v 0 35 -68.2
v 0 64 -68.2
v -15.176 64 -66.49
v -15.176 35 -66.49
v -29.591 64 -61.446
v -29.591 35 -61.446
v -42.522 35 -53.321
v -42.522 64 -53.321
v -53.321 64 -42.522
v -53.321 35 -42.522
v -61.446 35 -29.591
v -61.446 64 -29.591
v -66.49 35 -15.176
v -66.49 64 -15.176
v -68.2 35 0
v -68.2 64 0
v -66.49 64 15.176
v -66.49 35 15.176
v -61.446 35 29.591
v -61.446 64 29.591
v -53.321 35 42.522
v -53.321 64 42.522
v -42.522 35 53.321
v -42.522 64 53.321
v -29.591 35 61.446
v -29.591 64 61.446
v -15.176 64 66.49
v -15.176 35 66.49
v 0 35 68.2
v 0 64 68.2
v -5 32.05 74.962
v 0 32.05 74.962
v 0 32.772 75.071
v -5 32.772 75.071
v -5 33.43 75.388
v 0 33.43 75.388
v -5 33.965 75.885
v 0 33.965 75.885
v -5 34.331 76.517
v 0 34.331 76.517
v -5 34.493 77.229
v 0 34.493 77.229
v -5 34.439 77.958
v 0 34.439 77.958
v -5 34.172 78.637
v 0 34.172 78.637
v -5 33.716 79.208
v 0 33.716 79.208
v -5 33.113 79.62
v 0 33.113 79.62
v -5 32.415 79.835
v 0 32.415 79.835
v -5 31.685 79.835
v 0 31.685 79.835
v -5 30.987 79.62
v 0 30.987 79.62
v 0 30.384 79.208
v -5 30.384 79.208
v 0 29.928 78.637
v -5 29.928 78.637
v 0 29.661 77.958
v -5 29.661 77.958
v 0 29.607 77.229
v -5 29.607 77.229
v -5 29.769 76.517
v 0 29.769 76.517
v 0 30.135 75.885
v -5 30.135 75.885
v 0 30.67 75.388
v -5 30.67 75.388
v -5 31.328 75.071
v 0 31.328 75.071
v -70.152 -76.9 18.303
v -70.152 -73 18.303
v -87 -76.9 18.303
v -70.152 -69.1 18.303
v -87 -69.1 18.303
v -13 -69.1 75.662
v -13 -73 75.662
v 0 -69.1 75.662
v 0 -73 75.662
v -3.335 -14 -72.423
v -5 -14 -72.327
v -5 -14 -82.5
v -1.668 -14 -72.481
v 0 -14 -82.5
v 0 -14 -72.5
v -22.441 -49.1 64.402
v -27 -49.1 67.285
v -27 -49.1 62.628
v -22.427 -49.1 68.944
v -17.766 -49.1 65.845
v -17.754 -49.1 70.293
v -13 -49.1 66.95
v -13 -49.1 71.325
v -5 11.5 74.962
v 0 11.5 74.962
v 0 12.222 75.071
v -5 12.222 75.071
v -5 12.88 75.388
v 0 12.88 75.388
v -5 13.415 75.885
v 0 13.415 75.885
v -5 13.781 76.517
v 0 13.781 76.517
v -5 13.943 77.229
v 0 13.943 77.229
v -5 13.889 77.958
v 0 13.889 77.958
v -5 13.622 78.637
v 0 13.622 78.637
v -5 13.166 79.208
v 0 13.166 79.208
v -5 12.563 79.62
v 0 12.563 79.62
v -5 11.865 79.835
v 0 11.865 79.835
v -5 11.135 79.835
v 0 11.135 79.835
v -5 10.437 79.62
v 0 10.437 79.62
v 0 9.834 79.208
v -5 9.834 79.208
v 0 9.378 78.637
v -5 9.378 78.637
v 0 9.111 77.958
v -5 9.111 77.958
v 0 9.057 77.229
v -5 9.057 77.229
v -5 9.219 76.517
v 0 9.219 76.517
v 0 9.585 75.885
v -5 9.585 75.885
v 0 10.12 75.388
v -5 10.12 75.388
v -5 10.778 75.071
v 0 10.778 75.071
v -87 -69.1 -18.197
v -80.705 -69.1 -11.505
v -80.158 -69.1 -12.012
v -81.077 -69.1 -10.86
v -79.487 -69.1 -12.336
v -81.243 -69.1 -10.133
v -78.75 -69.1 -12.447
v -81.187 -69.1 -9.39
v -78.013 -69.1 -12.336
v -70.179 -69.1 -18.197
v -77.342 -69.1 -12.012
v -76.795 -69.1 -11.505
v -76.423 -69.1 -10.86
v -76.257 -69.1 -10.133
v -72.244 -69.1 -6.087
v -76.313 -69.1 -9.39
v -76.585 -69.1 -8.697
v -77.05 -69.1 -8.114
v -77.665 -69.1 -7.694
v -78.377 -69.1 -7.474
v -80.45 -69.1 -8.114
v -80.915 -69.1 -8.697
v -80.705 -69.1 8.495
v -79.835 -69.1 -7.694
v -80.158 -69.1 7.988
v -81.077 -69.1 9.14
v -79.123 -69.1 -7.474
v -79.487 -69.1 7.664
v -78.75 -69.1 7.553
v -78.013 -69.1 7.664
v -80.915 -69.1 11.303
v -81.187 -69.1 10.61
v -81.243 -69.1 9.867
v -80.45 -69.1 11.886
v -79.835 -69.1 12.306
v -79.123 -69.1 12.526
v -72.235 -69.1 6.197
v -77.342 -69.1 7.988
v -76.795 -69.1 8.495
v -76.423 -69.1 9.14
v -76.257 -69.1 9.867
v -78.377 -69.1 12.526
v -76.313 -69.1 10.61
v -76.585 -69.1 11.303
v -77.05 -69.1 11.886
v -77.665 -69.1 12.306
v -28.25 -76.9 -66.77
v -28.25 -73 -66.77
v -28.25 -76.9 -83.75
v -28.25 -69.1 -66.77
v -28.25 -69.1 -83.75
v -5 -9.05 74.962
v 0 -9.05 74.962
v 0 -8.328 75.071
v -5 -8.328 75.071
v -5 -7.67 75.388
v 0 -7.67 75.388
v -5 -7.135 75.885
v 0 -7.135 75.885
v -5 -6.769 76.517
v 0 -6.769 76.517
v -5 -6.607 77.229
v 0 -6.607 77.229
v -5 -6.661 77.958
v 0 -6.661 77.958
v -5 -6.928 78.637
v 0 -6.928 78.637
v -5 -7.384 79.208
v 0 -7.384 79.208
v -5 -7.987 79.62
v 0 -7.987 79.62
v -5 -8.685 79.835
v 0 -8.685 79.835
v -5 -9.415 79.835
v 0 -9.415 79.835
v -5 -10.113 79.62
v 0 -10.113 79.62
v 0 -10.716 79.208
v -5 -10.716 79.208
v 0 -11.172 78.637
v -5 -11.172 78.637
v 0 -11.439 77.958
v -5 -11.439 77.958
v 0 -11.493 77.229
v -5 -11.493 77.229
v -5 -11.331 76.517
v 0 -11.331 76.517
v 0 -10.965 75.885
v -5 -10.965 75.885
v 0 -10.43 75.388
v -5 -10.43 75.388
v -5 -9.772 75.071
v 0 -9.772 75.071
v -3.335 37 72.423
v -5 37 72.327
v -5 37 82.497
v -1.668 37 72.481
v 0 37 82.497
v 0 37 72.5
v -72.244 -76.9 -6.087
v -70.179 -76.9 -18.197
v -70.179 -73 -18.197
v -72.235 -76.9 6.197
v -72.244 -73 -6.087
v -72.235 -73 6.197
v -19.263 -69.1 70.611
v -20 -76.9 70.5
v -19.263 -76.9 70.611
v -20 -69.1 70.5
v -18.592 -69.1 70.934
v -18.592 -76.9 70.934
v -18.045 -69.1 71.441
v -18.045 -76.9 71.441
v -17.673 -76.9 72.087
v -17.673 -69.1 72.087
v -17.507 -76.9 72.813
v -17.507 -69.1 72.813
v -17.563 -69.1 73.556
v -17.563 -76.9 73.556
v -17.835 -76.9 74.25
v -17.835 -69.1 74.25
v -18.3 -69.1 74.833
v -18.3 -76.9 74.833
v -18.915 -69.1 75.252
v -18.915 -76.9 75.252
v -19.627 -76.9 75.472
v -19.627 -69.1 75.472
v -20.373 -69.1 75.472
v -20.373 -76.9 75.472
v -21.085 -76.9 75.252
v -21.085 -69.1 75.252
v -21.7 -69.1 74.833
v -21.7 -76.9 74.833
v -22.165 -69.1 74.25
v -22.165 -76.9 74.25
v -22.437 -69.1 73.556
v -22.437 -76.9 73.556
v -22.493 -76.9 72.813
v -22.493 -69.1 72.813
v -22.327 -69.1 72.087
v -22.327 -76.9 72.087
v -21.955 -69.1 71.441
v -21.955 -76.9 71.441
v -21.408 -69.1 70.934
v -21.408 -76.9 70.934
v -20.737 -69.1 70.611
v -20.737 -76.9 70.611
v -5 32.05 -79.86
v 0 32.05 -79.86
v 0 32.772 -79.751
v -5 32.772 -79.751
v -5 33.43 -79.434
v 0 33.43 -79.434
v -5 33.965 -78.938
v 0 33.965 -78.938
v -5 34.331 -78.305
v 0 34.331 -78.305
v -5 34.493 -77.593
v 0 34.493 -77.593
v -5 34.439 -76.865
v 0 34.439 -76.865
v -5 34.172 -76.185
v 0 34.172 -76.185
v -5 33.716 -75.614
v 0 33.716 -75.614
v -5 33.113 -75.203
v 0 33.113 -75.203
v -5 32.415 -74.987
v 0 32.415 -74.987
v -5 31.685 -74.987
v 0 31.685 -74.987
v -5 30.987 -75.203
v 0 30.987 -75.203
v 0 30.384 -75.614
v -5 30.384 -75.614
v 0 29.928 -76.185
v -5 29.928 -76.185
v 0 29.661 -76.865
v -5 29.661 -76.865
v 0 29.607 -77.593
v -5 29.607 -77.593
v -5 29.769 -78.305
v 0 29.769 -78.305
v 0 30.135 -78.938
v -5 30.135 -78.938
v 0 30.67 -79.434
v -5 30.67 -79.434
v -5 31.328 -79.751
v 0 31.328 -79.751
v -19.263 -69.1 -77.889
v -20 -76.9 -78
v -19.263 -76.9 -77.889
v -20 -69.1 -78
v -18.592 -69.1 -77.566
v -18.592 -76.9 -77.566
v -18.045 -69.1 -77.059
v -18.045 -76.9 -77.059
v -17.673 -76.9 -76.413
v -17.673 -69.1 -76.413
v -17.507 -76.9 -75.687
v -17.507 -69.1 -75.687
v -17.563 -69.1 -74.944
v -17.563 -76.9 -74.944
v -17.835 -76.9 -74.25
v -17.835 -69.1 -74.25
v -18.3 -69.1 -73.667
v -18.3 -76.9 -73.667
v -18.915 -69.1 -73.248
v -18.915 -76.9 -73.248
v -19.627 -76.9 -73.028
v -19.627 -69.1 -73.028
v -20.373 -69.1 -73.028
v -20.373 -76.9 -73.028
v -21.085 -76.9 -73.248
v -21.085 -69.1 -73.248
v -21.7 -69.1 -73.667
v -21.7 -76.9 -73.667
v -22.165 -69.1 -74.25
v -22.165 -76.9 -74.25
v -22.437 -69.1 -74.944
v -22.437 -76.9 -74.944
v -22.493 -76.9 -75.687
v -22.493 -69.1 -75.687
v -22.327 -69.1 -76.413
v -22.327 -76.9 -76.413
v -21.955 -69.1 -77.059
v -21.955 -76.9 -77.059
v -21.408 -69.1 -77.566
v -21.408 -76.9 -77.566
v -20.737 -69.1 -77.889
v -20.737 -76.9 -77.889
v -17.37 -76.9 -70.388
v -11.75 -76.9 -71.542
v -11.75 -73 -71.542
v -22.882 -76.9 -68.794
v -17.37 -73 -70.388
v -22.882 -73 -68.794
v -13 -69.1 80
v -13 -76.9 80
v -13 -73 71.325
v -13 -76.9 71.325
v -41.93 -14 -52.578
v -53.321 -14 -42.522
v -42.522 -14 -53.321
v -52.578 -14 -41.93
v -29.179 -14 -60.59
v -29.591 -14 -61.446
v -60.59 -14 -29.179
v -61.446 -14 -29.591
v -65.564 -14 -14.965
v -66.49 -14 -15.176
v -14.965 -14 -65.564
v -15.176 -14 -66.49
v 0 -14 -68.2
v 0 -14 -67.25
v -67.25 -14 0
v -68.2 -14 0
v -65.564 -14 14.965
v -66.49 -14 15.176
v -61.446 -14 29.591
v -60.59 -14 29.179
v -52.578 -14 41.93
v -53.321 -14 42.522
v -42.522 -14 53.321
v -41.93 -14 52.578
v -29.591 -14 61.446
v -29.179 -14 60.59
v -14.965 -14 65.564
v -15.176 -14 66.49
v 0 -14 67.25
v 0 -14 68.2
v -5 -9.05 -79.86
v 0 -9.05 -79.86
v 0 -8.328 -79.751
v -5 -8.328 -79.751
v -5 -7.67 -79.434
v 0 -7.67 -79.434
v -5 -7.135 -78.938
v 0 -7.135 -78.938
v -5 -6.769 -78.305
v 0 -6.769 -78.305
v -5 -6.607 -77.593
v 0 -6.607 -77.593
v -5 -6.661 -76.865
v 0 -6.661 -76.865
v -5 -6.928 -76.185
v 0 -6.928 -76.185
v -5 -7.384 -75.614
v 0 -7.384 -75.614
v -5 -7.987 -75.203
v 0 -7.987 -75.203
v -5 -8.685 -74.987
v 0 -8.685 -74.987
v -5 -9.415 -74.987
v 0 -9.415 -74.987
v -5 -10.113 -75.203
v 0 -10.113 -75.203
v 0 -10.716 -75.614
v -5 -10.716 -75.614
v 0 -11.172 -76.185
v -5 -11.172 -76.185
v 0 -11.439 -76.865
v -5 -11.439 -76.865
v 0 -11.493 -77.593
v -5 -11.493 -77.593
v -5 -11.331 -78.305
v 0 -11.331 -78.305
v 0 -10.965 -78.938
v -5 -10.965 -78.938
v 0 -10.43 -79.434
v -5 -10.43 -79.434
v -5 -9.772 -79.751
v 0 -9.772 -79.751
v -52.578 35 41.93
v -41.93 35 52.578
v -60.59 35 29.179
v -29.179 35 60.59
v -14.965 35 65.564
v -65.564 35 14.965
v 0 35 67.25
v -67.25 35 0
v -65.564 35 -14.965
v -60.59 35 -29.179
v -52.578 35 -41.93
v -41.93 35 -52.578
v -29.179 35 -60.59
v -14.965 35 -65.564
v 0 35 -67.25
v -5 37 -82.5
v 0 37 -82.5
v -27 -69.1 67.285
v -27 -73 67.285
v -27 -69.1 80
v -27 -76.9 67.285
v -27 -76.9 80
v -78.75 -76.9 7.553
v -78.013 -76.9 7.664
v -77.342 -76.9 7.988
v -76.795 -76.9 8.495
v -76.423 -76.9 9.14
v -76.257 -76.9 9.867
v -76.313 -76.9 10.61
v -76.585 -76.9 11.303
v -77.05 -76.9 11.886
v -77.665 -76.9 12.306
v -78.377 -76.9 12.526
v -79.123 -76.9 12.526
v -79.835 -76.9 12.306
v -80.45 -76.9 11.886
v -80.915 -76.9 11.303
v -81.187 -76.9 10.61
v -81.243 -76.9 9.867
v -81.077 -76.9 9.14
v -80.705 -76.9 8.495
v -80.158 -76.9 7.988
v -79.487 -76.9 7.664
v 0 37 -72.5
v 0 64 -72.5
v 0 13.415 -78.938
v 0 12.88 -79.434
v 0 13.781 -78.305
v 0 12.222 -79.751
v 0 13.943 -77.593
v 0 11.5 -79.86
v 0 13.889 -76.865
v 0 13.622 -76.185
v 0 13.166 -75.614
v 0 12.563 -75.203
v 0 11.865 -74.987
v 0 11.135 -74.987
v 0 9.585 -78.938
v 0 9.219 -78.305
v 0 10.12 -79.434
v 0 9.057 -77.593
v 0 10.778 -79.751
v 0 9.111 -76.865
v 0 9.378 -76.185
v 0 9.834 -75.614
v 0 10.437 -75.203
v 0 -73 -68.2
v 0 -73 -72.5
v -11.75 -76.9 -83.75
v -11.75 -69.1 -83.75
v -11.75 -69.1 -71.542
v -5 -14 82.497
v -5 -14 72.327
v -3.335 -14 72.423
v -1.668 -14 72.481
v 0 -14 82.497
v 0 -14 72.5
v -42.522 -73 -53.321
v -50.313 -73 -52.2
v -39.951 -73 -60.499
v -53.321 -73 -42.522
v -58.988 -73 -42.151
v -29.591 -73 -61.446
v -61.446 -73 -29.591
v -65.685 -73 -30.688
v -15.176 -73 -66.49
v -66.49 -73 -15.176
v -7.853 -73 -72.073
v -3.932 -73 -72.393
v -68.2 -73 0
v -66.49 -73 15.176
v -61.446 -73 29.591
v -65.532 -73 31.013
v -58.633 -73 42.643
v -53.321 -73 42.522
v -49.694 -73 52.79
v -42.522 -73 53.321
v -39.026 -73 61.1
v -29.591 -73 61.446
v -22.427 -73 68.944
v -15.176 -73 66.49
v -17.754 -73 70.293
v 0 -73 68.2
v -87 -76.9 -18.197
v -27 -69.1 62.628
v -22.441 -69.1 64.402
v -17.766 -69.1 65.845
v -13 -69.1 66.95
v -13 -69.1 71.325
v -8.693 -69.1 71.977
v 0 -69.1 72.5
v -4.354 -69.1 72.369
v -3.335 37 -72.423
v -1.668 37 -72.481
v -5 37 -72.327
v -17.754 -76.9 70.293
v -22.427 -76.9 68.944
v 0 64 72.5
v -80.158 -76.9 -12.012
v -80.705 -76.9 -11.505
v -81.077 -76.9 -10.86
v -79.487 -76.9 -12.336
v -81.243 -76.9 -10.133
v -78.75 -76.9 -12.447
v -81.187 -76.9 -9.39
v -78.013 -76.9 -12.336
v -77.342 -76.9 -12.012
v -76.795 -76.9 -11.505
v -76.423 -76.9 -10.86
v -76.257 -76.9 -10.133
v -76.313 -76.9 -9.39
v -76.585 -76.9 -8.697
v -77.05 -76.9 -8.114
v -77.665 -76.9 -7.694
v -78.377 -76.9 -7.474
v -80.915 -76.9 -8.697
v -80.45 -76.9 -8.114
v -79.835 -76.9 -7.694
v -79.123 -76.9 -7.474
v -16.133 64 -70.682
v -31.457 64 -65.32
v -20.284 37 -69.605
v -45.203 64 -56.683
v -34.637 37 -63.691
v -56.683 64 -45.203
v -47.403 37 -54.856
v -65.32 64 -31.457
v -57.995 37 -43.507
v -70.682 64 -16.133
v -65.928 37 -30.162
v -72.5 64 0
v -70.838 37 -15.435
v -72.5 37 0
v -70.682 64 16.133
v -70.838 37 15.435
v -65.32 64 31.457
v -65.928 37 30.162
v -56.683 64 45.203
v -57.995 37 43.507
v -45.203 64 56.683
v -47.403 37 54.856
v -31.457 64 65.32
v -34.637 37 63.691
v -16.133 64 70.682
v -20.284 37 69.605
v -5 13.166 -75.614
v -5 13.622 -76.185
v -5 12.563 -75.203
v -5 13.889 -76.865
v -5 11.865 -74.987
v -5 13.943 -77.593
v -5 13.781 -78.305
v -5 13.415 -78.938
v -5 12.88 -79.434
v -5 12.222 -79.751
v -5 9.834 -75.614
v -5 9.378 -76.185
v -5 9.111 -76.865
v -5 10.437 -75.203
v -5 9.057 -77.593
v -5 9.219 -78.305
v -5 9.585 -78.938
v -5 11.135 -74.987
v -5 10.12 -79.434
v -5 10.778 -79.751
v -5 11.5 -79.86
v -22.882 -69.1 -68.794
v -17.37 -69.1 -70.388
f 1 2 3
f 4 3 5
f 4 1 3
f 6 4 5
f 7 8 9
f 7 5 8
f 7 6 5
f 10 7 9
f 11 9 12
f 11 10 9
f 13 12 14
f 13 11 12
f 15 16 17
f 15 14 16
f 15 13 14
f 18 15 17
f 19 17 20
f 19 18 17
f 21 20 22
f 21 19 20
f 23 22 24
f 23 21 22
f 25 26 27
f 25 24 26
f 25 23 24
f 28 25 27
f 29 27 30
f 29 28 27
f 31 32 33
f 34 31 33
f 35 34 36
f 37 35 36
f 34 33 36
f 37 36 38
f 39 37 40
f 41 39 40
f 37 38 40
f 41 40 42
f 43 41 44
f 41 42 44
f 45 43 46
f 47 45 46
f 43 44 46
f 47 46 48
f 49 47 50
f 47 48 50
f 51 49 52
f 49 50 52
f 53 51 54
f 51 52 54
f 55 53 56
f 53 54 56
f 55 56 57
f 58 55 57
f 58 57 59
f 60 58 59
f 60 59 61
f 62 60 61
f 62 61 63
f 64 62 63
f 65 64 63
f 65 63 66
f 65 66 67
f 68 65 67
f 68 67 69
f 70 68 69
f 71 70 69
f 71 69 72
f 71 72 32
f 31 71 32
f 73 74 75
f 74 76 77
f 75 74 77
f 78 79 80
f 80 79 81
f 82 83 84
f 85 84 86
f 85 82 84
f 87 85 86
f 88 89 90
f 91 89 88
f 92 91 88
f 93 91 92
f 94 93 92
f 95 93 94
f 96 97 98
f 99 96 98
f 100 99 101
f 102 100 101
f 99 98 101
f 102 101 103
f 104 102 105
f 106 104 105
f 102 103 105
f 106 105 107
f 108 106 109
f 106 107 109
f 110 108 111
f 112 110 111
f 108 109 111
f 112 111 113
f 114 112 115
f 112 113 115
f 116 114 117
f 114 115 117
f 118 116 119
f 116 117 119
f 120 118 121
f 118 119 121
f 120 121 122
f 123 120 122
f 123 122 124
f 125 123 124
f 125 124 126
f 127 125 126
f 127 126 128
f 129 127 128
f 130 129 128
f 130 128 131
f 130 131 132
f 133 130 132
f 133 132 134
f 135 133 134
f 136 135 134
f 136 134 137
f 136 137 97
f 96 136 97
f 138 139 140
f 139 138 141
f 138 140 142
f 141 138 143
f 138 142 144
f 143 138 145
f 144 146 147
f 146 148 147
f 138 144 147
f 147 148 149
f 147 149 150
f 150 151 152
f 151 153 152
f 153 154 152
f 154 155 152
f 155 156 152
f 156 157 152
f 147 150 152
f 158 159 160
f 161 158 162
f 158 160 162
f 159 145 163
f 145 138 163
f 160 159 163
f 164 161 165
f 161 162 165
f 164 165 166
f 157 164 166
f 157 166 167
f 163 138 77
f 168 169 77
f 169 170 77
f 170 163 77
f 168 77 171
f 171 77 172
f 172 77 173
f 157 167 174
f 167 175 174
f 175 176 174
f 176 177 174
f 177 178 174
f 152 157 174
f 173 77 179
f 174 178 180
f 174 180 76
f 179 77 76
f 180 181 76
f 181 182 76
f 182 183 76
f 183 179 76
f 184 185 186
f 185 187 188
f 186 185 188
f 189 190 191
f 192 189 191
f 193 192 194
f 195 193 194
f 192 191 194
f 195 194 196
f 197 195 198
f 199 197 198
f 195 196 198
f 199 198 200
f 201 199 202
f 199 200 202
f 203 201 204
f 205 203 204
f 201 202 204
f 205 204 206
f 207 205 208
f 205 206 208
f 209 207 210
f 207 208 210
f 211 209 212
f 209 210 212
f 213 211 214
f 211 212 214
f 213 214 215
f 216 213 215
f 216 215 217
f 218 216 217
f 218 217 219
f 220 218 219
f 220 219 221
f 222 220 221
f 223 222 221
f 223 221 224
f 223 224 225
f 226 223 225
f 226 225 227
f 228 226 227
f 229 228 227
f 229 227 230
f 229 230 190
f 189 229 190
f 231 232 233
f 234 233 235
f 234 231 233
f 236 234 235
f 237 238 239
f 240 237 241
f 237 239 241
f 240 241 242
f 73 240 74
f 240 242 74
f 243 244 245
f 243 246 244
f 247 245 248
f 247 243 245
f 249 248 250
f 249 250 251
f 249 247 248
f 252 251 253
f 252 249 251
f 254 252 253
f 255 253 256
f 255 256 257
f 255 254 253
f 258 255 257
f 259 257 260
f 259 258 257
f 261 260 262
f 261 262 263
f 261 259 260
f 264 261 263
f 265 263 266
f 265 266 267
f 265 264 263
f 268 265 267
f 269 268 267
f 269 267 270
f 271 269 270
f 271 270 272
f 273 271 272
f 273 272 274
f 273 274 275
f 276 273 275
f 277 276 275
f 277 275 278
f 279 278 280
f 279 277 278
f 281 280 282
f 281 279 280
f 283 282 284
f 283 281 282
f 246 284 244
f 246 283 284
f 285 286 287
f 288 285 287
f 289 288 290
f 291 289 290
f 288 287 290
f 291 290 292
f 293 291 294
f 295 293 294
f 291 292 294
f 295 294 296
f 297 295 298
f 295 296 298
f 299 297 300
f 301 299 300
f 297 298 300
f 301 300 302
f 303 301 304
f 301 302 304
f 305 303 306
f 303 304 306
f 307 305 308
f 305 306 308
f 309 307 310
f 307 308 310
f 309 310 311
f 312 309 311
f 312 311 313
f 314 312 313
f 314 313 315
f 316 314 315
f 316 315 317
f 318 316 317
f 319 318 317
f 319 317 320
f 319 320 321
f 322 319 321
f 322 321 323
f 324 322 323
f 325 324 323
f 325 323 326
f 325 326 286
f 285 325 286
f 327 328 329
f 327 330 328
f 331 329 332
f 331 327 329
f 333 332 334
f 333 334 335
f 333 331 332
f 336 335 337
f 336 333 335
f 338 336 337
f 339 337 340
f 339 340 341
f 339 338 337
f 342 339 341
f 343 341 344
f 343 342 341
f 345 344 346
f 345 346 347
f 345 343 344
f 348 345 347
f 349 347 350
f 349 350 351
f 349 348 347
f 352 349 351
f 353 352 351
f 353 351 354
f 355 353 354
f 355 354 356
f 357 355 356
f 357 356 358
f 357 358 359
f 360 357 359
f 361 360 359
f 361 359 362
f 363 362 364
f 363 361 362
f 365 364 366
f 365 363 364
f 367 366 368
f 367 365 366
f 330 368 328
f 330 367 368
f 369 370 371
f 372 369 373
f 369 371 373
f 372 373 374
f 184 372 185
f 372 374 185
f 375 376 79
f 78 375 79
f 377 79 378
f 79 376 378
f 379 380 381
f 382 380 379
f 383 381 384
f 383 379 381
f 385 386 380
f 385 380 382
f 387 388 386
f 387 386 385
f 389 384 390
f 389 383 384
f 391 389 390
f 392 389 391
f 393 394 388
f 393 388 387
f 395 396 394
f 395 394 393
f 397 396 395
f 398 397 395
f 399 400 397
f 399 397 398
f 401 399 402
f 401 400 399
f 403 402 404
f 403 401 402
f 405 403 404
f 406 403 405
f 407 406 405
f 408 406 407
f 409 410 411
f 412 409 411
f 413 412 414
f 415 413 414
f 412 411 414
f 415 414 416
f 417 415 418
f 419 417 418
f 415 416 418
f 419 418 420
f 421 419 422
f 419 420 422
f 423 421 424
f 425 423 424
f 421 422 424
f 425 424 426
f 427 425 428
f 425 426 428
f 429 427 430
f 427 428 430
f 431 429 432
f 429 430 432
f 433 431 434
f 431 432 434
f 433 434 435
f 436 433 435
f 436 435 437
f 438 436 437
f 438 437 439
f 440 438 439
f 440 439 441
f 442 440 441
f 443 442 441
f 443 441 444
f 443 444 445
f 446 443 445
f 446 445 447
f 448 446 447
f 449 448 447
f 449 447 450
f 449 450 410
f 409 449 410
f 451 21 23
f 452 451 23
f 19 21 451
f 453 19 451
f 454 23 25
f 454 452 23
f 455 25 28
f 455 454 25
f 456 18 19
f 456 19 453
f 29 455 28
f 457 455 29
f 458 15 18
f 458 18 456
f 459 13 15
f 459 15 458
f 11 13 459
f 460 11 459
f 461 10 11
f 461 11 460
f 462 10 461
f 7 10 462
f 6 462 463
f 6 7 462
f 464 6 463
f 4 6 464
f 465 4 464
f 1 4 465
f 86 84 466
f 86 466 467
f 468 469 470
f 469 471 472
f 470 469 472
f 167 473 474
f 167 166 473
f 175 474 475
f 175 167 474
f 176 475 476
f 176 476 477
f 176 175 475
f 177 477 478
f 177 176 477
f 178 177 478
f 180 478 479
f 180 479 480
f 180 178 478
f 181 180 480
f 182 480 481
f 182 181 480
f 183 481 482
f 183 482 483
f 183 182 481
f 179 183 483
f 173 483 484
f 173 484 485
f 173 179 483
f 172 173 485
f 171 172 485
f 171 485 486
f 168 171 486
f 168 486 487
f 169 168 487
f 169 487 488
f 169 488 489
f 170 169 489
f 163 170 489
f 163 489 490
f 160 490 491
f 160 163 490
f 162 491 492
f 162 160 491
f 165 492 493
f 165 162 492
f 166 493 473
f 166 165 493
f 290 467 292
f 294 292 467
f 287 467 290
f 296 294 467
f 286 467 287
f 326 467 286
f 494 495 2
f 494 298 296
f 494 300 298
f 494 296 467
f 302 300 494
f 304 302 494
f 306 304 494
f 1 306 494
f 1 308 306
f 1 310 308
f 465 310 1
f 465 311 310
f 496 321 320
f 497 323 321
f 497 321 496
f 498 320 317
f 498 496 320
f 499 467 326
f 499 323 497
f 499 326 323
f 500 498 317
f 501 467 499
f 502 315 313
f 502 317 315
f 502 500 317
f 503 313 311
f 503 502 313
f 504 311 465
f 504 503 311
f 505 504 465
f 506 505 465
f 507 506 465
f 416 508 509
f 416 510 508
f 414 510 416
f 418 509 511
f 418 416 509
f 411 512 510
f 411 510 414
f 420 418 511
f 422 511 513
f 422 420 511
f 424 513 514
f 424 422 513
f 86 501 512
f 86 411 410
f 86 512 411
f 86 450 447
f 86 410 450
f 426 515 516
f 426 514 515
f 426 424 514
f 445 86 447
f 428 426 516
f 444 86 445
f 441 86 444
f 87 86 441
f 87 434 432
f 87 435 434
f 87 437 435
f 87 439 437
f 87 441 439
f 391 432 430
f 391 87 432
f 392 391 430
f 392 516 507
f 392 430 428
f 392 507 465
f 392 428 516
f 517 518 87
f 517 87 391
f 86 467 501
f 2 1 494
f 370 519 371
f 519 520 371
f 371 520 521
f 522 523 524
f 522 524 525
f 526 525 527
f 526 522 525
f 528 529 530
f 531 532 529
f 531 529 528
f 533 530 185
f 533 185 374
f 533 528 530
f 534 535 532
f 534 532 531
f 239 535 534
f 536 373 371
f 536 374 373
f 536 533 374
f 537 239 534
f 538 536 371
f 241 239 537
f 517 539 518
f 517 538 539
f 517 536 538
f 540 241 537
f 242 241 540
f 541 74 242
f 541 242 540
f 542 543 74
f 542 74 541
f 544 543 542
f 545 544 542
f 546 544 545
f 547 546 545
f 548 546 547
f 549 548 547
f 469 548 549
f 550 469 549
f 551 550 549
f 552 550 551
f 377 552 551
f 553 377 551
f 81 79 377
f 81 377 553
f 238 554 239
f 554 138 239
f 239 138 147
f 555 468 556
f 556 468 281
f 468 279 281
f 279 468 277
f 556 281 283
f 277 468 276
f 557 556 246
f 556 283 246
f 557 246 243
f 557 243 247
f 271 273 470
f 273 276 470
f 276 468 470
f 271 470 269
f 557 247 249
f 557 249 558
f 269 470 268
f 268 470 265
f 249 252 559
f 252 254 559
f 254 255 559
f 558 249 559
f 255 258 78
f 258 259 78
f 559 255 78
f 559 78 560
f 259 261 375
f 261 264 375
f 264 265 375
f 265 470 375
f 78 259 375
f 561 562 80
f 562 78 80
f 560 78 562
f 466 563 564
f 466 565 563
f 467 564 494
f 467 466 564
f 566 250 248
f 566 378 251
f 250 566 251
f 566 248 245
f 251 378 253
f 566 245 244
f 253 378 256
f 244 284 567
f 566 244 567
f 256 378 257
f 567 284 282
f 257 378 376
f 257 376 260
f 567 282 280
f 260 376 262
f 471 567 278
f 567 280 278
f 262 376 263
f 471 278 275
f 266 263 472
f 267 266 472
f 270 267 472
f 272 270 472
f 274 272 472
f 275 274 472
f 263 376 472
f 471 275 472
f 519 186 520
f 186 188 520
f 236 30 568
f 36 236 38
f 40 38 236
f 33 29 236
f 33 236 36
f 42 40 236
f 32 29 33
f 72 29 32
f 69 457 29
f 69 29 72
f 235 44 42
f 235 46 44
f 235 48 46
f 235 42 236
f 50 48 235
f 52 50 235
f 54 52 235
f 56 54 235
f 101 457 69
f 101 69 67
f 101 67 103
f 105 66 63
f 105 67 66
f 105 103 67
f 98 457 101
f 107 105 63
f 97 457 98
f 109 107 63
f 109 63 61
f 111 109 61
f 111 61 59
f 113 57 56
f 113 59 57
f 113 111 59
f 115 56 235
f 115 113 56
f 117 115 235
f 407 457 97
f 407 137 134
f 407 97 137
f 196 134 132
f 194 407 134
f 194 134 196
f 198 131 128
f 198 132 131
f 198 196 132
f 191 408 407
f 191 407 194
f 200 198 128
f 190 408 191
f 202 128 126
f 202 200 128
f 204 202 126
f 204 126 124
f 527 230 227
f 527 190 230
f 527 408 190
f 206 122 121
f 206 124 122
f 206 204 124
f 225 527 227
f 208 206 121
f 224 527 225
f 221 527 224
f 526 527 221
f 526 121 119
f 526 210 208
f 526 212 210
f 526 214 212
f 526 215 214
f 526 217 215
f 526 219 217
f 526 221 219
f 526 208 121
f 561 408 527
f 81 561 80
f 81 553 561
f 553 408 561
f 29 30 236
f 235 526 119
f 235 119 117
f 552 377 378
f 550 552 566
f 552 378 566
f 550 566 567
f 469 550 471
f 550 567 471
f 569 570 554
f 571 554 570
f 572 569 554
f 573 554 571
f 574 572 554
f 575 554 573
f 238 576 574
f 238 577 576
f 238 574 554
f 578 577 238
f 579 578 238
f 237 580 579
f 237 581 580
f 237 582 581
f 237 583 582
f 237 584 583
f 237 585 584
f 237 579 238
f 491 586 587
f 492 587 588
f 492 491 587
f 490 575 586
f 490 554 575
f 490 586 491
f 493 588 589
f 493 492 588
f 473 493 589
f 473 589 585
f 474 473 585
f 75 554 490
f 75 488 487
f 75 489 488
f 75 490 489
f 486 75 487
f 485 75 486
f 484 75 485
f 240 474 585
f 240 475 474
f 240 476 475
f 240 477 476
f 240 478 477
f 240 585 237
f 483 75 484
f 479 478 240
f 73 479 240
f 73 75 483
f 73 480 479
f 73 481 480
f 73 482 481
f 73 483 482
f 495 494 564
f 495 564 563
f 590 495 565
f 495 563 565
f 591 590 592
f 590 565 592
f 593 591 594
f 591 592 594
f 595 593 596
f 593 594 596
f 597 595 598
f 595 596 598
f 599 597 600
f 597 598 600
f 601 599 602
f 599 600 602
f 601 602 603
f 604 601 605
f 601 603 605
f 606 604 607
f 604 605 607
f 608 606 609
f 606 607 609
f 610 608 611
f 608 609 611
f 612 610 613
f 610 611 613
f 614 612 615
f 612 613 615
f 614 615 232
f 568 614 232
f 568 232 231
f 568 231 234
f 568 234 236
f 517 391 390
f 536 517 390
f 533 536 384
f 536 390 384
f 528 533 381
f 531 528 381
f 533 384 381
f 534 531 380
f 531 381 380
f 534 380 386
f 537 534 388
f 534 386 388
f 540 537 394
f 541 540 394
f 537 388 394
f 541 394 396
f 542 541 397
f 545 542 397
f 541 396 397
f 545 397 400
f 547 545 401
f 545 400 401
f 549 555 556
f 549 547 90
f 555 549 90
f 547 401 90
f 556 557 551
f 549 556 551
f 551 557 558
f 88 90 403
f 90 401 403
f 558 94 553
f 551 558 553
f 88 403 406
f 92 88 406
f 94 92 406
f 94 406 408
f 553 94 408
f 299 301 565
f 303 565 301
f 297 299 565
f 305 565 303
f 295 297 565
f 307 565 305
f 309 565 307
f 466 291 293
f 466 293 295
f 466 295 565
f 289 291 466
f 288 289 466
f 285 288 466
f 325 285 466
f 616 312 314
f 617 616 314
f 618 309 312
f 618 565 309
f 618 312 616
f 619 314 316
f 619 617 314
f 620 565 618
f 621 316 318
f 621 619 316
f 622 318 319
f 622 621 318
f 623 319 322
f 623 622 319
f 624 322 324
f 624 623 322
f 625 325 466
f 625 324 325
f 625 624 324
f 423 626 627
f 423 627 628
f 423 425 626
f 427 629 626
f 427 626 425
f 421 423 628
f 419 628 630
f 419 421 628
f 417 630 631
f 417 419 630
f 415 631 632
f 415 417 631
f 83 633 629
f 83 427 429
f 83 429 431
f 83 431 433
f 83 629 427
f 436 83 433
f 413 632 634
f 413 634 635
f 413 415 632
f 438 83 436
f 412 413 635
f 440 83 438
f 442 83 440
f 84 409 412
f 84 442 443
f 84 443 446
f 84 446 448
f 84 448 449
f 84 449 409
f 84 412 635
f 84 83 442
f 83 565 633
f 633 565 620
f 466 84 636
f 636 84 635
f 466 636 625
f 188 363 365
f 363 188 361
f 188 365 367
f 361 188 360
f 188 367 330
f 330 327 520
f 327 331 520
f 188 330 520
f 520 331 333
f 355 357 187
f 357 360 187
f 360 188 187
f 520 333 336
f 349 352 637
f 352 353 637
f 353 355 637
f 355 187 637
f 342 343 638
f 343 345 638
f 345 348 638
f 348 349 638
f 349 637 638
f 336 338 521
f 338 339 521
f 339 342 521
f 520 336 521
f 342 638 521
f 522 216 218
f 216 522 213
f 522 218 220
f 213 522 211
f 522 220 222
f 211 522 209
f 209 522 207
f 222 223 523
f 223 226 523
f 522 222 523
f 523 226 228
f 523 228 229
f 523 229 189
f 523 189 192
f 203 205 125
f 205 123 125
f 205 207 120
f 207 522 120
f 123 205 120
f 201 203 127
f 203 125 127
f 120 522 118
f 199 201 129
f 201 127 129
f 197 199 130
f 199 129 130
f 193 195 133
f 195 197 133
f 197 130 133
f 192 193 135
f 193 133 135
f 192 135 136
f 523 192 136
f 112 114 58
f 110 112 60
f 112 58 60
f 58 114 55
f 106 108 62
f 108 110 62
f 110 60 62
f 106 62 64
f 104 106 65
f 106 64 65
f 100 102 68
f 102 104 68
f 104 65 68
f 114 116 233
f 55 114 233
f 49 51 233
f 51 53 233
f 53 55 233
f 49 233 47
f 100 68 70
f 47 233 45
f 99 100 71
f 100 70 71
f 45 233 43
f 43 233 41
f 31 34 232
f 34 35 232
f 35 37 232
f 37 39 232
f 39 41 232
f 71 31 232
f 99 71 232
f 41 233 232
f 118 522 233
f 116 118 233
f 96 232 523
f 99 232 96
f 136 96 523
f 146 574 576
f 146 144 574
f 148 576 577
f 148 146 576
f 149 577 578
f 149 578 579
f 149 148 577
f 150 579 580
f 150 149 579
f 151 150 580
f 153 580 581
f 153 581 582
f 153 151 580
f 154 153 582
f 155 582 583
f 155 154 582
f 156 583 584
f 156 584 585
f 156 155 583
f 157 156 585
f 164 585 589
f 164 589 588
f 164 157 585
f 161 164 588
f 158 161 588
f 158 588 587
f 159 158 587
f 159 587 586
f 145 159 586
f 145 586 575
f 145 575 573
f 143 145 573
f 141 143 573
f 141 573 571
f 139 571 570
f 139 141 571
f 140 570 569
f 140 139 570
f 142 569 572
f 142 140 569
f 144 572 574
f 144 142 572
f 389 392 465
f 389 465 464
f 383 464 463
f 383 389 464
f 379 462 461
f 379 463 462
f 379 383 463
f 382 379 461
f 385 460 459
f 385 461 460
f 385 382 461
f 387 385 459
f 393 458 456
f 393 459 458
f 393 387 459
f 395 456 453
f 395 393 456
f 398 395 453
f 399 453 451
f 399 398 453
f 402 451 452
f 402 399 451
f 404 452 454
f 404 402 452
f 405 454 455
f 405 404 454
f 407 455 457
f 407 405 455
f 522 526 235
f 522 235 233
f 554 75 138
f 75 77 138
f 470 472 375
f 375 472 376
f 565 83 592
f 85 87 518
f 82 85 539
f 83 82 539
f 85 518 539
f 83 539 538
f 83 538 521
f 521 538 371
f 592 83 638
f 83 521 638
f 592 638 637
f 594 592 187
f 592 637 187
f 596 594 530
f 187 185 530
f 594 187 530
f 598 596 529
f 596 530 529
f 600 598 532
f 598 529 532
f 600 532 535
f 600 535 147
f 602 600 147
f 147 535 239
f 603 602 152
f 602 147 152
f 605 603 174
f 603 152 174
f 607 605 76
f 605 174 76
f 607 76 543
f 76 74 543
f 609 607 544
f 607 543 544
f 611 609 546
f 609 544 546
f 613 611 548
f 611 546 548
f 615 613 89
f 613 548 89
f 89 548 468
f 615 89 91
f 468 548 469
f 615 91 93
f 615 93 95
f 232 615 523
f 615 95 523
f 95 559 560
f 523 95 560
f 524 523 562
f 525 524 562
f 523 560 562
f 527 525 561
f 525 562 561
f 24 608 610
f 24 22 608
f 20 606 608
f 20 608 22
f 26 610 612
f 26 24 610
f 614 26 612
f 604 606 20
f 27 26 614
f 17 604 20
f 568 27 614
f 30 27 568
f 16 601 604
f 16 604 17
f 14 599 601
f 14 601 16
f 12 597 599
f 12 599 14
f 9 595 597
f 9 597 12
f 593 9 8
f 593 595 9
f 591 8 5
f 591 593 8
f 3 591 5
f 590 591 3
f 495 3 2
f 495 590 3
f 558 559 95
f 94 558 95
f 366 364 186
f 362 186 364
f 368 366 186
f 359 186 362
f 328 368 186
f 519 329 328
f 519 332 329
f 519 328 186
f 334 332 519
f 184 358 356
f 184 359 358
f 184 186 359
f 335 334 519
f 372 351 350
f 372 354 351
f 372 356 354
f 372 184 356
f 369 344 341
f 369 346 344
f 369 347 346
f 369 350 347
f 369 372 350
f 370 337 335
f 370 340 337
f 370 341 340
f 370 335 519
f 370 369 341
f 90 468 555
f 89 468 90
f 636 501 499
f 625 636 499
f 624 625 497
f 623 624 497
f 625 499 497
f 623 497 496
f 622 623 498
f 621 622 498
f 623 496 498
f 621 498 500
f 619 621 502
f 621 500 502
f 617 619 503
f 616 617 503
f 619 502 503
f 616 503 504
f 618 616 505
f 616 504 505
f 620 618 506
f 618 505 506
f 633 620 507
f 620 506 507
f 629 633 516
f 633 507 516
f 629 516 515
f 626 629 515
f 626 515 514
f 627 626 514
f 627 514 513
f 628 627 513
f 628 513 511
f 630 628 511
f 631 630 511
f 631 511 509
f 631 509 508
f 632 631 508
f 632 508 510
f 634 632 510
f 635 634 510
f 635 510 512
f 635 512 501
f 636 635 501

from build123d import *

# Parameters (mm, degrees)
BOSS_EXTRUDE1_DEPTH  = 10
BOSS_EXTRUDE2_START  = 73
BOSS_EXTRUDE2_DEPTH  = 73
SKETCH4_R            = 2.5
BOSS_EXTRUDE3_DEPTH  = 3.9
SKETCH6_R            = 2.45
CUT_EXTRUDE1_DEPTH   = 13.9
SKETCH7_W            = 14
SKETCH7_H            = 20
CUT_EXTRUDE2_DEPTH   = 23.9
BOSS_EXTRUDE4_START  = -3.9
BOSS_EXTRUDE4_DEPTH  = 3.9
SKETCH12_W           = 5
SKETCH12_H           = 10
BOSS_EXTRUDE5_DEPTH  = 0.17
CUT_EXTRUDE3_START   = -73
SKETCH13_R           = 68.75
CUT_EXTRUDE3_DEPTH   = 73
BOSS_EXTRUDE6_DEPTH  = 27
BOSS_EXTRUDE7_DEPTH  = 27
BOSS_EXTRUDE8_DEPTH  = 73
BOSS_EXTRUDE9_START  = -37
BOSS_EXTRUDE9_DEPTH  = 37
BOSS_EXTRUDE10_START = 14
BOSS_EXTRUDE10_DEPTH = 14
CUT_EXTRUDE4_START   = -2
CUT_EXTRUDE4_DEPTH   = 2
SKETCH21_W           = 14
SKETCH21_H           = 20
CUT_EXTRUDE5_DEPTH   = 22
BOSS_EXTRUDE11_START = 14
BOSS_EXTRUDE11_DEPTH = 14
BOSS_EXTRUDE12_START = -5
SKETCH25_R           = 2.45
BOSS_EXTRUDE12_DEPTH = 5
SKETCH24_R           = 2.45
CUT_EXTRUDE6_DEPTH   = 22
BOSS_EXTRUDE13_START = -5
SKETCH26_R           = 2.45
BOSS_EXTRUDE13_DEPTH = 5
BOSS_EXTRUDE14_START = 14
BOSS_EXTRUDE14_DEPTH = 14
SKETCH29_R           = 2.45
CUT_EXTRUDE7_DEPTH   = 22


with BuildPart() as part:
    # Sketch1 → Boss-Extrude1 (new body)
    with BuildSketch(Plane(origin=(0, 0, 0), x_dir=(1, 0, 0), z_dir=(0, 1, 0))):
        with BuildLine():
            Line((0, -67.5), (0, -82.327380707))
            Line((0, -82.327380707), (-5, -82.327380707))
            Line((-5, -82.327380707), (-5, -72.327380707))
            ThreePointArc((-5, -72.327380707), (-72.5, 0), (-5, 72.327380707))
            Line((-5, 72.327380707), (-5, 82.5))
            Line((-5, 82.5), (0, 82.5))
            Line((0, 82.5), (0, 67.5))
            ThreePointArc((0, 67.5), (-67.5, 0), (0, -67.5))
        make_face()
    extrude(amount=BOSS_EXTRUDE1_DEPTH)

    # Sketch2 → Boss-Extrude2 (add)
    with BuildSketch(Plane.XZ.offset(BOSS_EXTRUDE2_START)):
        with BuildLine():
            Line((0, 72.5), (0, 68.5))
            ThreePointArc((0, 68.5), (-68.5, 0), (0, -68.5))
            Line((0, -68.5), (0, -72.5))
            ThreePointArc((0, -72.5), (-72.5, 0), (0, 72.5))
        make_face()
    extrude(amount=-BOSS_EXTRUDE2_DEPTH)

    # Sketch4 → Boss-Extrude3 (add, symmetric)
    # profile 1 of 3: a face of its own
    with BuildSketch(Plane.XZ.offset(73)):
        with BuildLine():
            Line((-70.151512279, 18.30342386), (-87, 18.30342386))
            Line((-87, 18.30342386), (-87, -18.19657614))
            Line((-87, -18.19657614), (-70.179303336, -18.19657614))
            ThreePointArc((-70.179303336, -18.19657614), (-72.499978985, 0.055201399), (-70.151512279, 18.30342386))
        make_face()
        with Locations(Location((-78.75, 10.05342386, 0), (0, 0, 270))):
            Circle(SKETCH4_R, mode=Mode.SUBTRACT)
        with Locations(Location((-78.75, -9.94657614, 0), (0, 0, 270))):
            Circle(SKETCH4_R, mode=Mode.SUBTRACT)
    # profile 2 of 3: a face of its own
    with BuildSketch(Plane.XZ.offset(73)):
        with BuildLine():
            Line((-28.25, -66.769660026), (-28.25, -83.75))
            Line((-28.25, -83.75), (-11.75, -83.75))
            Line((-11.75, -83.75), (-11.75, -71.54150893))
            ThreePointArc((-11.75, -71.54150893), (-20.141813113, -69.645942915), (-28.25, -66.769660026))
        make_face()
        with Locations(Location((-20, -75.5, 0), (0, 0, 270))):
            Circle(SKETCH4_R, mode=Mode.SUBTRACT)
    # profile 3 of 3: a face of its own
    with BuildSketch(Plane.XZ.offset(73)):
        with BuildLine():
            Line((-27, 67.284842275), (-27, 80))
            Line((-27, 80), (-13, 80))
            Line((-13, 80), (-13, 71.324960568))
            ThreePointArc((-13, 71.324960568), (-20.101757111, 69.657514749), (-27, 67.284842275))
        make_face()
        with Locations(Location((-20, 73, 0), (0, 0, 270))):
            Circle(SKETCH4_R, mode=Mode.SUBTRACT)
    extrude(amount=BOSS_EXTRUDE3_DEPTH, both=True)

    # Sketch6 → Cut-Extrude1 (cut)
    with BuildSketch(Plane.ZY.offset(5)):
        with Locations((77.412380707, 5)):
            Circle(SKETCH6_R)
        with Locations((-77.413690354, 5)):
            Circle(SKETCH6_R)
    extrude(amount=-CUT_EXTRUDE1_DEPTH, mode=Mode.SUBTRACT)

    # Sketch7 → Cut-Extrude2 (cut)
    with BuildSketch(Plane.XY.offset(80)):
        with Locations((-20, -59.1)):
            Rectangle(SKETCH7_W, SKETCH7_H)
    extrude(amount=-CUT_EXTRUDE2_DEPTH, mode=Mode.SUBTRACT)

    # Sketch10 → Boss-Extrude4 (add)
    with BuildSketch(Plane(origin=(0, -69.1, 0), x_dir=(1, 0, 0), z_dir=(0, 1, 0)).offset(BOSS_EXTRUDE4_START)):
        with BuildLine():
            Line((-13, -71.324960568), (-13, -75.662480284))
            Line((-13, -75.662480284), (0, -75.662480284))
            Line((0, -75.662480284), (0, -72.5))
            ThreePointArc((0, -72.5), (-6.526498251, -72.205642581), (-13, -71.324960568))
        make_face()
    extrude(amount=BOSS_EXTRUDE4_DEPTH)

    # Sketch12 → Boss-Extrude5 (add)
    with BuildSketch(Plane.XY.offset(82.327380707)):
        with Locations((-2.5, 5)):
            Rectangle(SKETCH12_W, SKETCH12_H)
    extrude(amount=BOSS_EXTRUDE5_DEPTH)

    # Sketch13 → Cut-Extrude3 (cut)
    with BuildSketch(Plane.XZ.offset(73).offset(CUT_EXTRUDE3_START)):
        Circle(SKETCH13_R)
    extrude(amount=CUT_EXTRUDE3_DEPTH, mode=Mode.SUBTRACT)

    # Sketch14 → Boss-Extrude6 (add)
    with BuildSketch(Plane(origin=(0, 10, 0), x_dir=(1, 0, 0), z_dir=(0, 1, 0))):
        with BuildLine():
            Line((-5, -72.327380707), (-5, -82.497380707))
            Line((-5, -82.497380707), (0, -82.497380707))
            Line((0, -82.497380707), (0, -67.5))
            ThreePointArc((0, -67.5), (-67.5, 0), (0, 67.5))
            Line((0, 67.5), (0, 82.5))
            Line((0, 82.5), (-5, 82.5))
            Line((-5, 82.5), (-5, 72.327380707))
            ThreePointArc((-5, 72.327380707), (-72.5, 0), (-5, -72.327380707))
        make_face()
    extrude(amount=BOSS_EXTRUDE6_DEPTH)

    # Sketch15 → Boss-Extrude7 (add)
    with BuildSketch(Plane(origin=(0, 37, 0), x_dir=(1, 0, 0), z_dir=(0, 1, 0))):
        with BuildLine():
            Line((0, 68.2), (0, 72.5))
            ThreePointArc((0, 72.5), (-72.5, 0), (0, -72.5))
            Line((0, -72.5), (0, -68.2))
            ThreePointArc((0, -68.2), (-68.2, 0), (0, 68.2))
        make_face()
    extrude(amount=BOSS_EXTRUDE7_DEPTH)

    # Sketch17 → Boss-Extrude8 (add)
    with BuildSketch(Plane.XZ):
        with BuildLine():
            Line((0, 68.2), (0, 68.75))
            ThreePointArc((0, 68.75), (-68.75, 0), (0, -68.75))
            Line((0, -68.75), (0, -68.2))
            ThreePointArc((0, -68.2), (-68.2, 0), (0, 68.2))
        make_face()
    extrude(amount=BOSS_EXTRUDE8_DEPTH)

    # Sketch18 → Boss-Extrude9 (add)
    with BuildSketch(Plane(origin=(0, 37, 0), x_dir=(1, 0, 0), z_dir=(0, 1, 0)).offset(BOSS_EXTRUDE9_START)):
        with BuildLine():
            Line((0, -67.25), (0, -67.5))
            ThreePointArc((0, -67.5), (-67.5, 0), (0, 67.5))
            Line((0, 67.5), (0, 67.25))
            ThreePointArc((0, 67.25), (-67.25, 0), (0, -67.25))
        make_face()
    extrude(amount=BOSS_EXTRUDE9_DEPTH)

    # Sketch19 → Boss-Extrude10 (add)
    with BuildSketch(Plane.XZ.offset(BOSS_EXTRUDE10_START)):
        with BuildLine():
            Line((0, -68.2), (0, -67.25))
            ThreePointArc((0, -67.25), (-67.25, 0), (0, 67.25))
            Line((0, 67.25), (0, 68.2))
            ThreePointArc((0, 68.2), (-68.2, 0), (0, -68.2))
        make_face()
    extrude(amount=-BOSS_EXTRUDE10_DEPTH)

    # Sketch20 → Cut-Extrude4 (cut)
    with BuildSketch(Plane(origin=(0, 37, 0), x_dir=(1, 0, 0), z_dir=(0, 1, 0)).offset(CUT_EXTRUDE4_START)):
        with BuildLine():
            Line((0, 67.25), (0, 68.2))
            ThreePointArc((0, 68.2), (-68.2, 0), (0, -68.2))
            Line((0, -68.2), (0, -67.25))
            ThreePointArc((0, -67.25), (-67.25, 0), (0, 67.25))
        make_face()
    extrude(amount=CUT_EXTRUDE4_DEPTH, mode=Mode.SUBTRACT)

    # Sketch21 → Cut-Extrude5 (cut)
    with BuildSketch(Plane.XY.offset(80)):
        with Locations((-20, -59.1)):
            Rectangle(SKETCH21_W, SKETCH21_H)
    extrude(amount=-CUT_EXTRUDE5_DEPTH, mode=Mode.SUBTRACT)

    # Sketch23 → Boss-Extrude11 (add)
    with BuildSketch(Plane.XZ.offset(BOSS_EXTRUDE11_START)):
        with BuildLine():
            Line((0, 72.5), (0, 82.497380707))
            Line((0, 82.497380707), (-5, 82.497380707))
            Line((-5, 82.497380707), (-5, 72.327380707))
            ThreePointArc((-5, 72.327380707), (-2.501489427, 72.456832325), (0, 72.5))
        make_face()
    extrude(amount=-BOSS_EXTRUDE11_DEPTH)

    # Sketch25 → Boss-Extrude12 (add)
    with BuildSketch(Plane(origin=(0, 0, 0), x_dir=(0, 0, -1), z_dir=(1, 0, 0)).offset(BOSS_EXTRUDE12_START)):
        with Locations((-77.412380707, 5)):
            Circle(SKETCH25_R)
    extrude(amount=BOSS_EXTRUDE12_DEPTH)

    # Sketch24 → Cut-Extrude6 (cut)
    with BuildSketch(Plane(origin=(0, 0, 0), x_dir=(0, 0, -1), z_dir=(1, 0, 0))):
        with Locations((-77.412380707, -9.05)):
            Circle(SKETCH24_R)
        with Locations((-77.412380707, 32.05)):
            Circle(SKETCH24_R)
        with Locations((-77.412380707, 11.5)):
            Circle(SKETCH24_R)
    extrude(amount=-CUT_EXTRUDE6_DEPTH, mode=Mode.SUBTRACT)

    # Sketch26 → Boss-Extrude13 (add)
    with BuildSketch(Plane(origin=(0, 0, 0), x_dir=(0, 0, -1), z_dir=(1, 0, 0)).offset(BOSS_EXTRUDE13_START)):
        with Locations((77.413690354, 5)):
            Circle(SKETCH26_R)
    extrude(amount=BOSS_EXTRUDE13_DEPTH)

    # Sketch27 → Boss-Extrude14 (add)
    with BuildSketch(Plane.XZ.offset(BOSS_EXTRUDE14_START)):
        with BuildLine():
            Line((-5, -72.327380707), (-5, -82.5))
            Line((-5, -82.5), (0, -82.5))
            Line((0, -82.5), (0, -72.5))
            ThreePointArc((0, -72.5), (-2.501489427, -72.456832325), (-5, -72.327380707))
        make_face()
    extrude(amount=-BOSS_EXTRUDE14_DEPTH)

    # Sketch29 → Cut-Extrude7 (cut)
    with BuildSketch(Plane(origin=(0, 0, 0), x_dir=(0, 0, -1), z_dir=(1, 0, 0))):
        with Locations((77.41, 32.05)):
            Circle(SKETCH29_R)
        with Locations((77.41, 11.5)):
            Circle(SKETCH29_R)
        with Locations((77.41, -9.05)):
            Circle(SKETCH29_R)
    extrude(amount=-CUT_EXTRUDE7_DEPTH, mode=Mode.SUBTRACT)


solid = part.part
